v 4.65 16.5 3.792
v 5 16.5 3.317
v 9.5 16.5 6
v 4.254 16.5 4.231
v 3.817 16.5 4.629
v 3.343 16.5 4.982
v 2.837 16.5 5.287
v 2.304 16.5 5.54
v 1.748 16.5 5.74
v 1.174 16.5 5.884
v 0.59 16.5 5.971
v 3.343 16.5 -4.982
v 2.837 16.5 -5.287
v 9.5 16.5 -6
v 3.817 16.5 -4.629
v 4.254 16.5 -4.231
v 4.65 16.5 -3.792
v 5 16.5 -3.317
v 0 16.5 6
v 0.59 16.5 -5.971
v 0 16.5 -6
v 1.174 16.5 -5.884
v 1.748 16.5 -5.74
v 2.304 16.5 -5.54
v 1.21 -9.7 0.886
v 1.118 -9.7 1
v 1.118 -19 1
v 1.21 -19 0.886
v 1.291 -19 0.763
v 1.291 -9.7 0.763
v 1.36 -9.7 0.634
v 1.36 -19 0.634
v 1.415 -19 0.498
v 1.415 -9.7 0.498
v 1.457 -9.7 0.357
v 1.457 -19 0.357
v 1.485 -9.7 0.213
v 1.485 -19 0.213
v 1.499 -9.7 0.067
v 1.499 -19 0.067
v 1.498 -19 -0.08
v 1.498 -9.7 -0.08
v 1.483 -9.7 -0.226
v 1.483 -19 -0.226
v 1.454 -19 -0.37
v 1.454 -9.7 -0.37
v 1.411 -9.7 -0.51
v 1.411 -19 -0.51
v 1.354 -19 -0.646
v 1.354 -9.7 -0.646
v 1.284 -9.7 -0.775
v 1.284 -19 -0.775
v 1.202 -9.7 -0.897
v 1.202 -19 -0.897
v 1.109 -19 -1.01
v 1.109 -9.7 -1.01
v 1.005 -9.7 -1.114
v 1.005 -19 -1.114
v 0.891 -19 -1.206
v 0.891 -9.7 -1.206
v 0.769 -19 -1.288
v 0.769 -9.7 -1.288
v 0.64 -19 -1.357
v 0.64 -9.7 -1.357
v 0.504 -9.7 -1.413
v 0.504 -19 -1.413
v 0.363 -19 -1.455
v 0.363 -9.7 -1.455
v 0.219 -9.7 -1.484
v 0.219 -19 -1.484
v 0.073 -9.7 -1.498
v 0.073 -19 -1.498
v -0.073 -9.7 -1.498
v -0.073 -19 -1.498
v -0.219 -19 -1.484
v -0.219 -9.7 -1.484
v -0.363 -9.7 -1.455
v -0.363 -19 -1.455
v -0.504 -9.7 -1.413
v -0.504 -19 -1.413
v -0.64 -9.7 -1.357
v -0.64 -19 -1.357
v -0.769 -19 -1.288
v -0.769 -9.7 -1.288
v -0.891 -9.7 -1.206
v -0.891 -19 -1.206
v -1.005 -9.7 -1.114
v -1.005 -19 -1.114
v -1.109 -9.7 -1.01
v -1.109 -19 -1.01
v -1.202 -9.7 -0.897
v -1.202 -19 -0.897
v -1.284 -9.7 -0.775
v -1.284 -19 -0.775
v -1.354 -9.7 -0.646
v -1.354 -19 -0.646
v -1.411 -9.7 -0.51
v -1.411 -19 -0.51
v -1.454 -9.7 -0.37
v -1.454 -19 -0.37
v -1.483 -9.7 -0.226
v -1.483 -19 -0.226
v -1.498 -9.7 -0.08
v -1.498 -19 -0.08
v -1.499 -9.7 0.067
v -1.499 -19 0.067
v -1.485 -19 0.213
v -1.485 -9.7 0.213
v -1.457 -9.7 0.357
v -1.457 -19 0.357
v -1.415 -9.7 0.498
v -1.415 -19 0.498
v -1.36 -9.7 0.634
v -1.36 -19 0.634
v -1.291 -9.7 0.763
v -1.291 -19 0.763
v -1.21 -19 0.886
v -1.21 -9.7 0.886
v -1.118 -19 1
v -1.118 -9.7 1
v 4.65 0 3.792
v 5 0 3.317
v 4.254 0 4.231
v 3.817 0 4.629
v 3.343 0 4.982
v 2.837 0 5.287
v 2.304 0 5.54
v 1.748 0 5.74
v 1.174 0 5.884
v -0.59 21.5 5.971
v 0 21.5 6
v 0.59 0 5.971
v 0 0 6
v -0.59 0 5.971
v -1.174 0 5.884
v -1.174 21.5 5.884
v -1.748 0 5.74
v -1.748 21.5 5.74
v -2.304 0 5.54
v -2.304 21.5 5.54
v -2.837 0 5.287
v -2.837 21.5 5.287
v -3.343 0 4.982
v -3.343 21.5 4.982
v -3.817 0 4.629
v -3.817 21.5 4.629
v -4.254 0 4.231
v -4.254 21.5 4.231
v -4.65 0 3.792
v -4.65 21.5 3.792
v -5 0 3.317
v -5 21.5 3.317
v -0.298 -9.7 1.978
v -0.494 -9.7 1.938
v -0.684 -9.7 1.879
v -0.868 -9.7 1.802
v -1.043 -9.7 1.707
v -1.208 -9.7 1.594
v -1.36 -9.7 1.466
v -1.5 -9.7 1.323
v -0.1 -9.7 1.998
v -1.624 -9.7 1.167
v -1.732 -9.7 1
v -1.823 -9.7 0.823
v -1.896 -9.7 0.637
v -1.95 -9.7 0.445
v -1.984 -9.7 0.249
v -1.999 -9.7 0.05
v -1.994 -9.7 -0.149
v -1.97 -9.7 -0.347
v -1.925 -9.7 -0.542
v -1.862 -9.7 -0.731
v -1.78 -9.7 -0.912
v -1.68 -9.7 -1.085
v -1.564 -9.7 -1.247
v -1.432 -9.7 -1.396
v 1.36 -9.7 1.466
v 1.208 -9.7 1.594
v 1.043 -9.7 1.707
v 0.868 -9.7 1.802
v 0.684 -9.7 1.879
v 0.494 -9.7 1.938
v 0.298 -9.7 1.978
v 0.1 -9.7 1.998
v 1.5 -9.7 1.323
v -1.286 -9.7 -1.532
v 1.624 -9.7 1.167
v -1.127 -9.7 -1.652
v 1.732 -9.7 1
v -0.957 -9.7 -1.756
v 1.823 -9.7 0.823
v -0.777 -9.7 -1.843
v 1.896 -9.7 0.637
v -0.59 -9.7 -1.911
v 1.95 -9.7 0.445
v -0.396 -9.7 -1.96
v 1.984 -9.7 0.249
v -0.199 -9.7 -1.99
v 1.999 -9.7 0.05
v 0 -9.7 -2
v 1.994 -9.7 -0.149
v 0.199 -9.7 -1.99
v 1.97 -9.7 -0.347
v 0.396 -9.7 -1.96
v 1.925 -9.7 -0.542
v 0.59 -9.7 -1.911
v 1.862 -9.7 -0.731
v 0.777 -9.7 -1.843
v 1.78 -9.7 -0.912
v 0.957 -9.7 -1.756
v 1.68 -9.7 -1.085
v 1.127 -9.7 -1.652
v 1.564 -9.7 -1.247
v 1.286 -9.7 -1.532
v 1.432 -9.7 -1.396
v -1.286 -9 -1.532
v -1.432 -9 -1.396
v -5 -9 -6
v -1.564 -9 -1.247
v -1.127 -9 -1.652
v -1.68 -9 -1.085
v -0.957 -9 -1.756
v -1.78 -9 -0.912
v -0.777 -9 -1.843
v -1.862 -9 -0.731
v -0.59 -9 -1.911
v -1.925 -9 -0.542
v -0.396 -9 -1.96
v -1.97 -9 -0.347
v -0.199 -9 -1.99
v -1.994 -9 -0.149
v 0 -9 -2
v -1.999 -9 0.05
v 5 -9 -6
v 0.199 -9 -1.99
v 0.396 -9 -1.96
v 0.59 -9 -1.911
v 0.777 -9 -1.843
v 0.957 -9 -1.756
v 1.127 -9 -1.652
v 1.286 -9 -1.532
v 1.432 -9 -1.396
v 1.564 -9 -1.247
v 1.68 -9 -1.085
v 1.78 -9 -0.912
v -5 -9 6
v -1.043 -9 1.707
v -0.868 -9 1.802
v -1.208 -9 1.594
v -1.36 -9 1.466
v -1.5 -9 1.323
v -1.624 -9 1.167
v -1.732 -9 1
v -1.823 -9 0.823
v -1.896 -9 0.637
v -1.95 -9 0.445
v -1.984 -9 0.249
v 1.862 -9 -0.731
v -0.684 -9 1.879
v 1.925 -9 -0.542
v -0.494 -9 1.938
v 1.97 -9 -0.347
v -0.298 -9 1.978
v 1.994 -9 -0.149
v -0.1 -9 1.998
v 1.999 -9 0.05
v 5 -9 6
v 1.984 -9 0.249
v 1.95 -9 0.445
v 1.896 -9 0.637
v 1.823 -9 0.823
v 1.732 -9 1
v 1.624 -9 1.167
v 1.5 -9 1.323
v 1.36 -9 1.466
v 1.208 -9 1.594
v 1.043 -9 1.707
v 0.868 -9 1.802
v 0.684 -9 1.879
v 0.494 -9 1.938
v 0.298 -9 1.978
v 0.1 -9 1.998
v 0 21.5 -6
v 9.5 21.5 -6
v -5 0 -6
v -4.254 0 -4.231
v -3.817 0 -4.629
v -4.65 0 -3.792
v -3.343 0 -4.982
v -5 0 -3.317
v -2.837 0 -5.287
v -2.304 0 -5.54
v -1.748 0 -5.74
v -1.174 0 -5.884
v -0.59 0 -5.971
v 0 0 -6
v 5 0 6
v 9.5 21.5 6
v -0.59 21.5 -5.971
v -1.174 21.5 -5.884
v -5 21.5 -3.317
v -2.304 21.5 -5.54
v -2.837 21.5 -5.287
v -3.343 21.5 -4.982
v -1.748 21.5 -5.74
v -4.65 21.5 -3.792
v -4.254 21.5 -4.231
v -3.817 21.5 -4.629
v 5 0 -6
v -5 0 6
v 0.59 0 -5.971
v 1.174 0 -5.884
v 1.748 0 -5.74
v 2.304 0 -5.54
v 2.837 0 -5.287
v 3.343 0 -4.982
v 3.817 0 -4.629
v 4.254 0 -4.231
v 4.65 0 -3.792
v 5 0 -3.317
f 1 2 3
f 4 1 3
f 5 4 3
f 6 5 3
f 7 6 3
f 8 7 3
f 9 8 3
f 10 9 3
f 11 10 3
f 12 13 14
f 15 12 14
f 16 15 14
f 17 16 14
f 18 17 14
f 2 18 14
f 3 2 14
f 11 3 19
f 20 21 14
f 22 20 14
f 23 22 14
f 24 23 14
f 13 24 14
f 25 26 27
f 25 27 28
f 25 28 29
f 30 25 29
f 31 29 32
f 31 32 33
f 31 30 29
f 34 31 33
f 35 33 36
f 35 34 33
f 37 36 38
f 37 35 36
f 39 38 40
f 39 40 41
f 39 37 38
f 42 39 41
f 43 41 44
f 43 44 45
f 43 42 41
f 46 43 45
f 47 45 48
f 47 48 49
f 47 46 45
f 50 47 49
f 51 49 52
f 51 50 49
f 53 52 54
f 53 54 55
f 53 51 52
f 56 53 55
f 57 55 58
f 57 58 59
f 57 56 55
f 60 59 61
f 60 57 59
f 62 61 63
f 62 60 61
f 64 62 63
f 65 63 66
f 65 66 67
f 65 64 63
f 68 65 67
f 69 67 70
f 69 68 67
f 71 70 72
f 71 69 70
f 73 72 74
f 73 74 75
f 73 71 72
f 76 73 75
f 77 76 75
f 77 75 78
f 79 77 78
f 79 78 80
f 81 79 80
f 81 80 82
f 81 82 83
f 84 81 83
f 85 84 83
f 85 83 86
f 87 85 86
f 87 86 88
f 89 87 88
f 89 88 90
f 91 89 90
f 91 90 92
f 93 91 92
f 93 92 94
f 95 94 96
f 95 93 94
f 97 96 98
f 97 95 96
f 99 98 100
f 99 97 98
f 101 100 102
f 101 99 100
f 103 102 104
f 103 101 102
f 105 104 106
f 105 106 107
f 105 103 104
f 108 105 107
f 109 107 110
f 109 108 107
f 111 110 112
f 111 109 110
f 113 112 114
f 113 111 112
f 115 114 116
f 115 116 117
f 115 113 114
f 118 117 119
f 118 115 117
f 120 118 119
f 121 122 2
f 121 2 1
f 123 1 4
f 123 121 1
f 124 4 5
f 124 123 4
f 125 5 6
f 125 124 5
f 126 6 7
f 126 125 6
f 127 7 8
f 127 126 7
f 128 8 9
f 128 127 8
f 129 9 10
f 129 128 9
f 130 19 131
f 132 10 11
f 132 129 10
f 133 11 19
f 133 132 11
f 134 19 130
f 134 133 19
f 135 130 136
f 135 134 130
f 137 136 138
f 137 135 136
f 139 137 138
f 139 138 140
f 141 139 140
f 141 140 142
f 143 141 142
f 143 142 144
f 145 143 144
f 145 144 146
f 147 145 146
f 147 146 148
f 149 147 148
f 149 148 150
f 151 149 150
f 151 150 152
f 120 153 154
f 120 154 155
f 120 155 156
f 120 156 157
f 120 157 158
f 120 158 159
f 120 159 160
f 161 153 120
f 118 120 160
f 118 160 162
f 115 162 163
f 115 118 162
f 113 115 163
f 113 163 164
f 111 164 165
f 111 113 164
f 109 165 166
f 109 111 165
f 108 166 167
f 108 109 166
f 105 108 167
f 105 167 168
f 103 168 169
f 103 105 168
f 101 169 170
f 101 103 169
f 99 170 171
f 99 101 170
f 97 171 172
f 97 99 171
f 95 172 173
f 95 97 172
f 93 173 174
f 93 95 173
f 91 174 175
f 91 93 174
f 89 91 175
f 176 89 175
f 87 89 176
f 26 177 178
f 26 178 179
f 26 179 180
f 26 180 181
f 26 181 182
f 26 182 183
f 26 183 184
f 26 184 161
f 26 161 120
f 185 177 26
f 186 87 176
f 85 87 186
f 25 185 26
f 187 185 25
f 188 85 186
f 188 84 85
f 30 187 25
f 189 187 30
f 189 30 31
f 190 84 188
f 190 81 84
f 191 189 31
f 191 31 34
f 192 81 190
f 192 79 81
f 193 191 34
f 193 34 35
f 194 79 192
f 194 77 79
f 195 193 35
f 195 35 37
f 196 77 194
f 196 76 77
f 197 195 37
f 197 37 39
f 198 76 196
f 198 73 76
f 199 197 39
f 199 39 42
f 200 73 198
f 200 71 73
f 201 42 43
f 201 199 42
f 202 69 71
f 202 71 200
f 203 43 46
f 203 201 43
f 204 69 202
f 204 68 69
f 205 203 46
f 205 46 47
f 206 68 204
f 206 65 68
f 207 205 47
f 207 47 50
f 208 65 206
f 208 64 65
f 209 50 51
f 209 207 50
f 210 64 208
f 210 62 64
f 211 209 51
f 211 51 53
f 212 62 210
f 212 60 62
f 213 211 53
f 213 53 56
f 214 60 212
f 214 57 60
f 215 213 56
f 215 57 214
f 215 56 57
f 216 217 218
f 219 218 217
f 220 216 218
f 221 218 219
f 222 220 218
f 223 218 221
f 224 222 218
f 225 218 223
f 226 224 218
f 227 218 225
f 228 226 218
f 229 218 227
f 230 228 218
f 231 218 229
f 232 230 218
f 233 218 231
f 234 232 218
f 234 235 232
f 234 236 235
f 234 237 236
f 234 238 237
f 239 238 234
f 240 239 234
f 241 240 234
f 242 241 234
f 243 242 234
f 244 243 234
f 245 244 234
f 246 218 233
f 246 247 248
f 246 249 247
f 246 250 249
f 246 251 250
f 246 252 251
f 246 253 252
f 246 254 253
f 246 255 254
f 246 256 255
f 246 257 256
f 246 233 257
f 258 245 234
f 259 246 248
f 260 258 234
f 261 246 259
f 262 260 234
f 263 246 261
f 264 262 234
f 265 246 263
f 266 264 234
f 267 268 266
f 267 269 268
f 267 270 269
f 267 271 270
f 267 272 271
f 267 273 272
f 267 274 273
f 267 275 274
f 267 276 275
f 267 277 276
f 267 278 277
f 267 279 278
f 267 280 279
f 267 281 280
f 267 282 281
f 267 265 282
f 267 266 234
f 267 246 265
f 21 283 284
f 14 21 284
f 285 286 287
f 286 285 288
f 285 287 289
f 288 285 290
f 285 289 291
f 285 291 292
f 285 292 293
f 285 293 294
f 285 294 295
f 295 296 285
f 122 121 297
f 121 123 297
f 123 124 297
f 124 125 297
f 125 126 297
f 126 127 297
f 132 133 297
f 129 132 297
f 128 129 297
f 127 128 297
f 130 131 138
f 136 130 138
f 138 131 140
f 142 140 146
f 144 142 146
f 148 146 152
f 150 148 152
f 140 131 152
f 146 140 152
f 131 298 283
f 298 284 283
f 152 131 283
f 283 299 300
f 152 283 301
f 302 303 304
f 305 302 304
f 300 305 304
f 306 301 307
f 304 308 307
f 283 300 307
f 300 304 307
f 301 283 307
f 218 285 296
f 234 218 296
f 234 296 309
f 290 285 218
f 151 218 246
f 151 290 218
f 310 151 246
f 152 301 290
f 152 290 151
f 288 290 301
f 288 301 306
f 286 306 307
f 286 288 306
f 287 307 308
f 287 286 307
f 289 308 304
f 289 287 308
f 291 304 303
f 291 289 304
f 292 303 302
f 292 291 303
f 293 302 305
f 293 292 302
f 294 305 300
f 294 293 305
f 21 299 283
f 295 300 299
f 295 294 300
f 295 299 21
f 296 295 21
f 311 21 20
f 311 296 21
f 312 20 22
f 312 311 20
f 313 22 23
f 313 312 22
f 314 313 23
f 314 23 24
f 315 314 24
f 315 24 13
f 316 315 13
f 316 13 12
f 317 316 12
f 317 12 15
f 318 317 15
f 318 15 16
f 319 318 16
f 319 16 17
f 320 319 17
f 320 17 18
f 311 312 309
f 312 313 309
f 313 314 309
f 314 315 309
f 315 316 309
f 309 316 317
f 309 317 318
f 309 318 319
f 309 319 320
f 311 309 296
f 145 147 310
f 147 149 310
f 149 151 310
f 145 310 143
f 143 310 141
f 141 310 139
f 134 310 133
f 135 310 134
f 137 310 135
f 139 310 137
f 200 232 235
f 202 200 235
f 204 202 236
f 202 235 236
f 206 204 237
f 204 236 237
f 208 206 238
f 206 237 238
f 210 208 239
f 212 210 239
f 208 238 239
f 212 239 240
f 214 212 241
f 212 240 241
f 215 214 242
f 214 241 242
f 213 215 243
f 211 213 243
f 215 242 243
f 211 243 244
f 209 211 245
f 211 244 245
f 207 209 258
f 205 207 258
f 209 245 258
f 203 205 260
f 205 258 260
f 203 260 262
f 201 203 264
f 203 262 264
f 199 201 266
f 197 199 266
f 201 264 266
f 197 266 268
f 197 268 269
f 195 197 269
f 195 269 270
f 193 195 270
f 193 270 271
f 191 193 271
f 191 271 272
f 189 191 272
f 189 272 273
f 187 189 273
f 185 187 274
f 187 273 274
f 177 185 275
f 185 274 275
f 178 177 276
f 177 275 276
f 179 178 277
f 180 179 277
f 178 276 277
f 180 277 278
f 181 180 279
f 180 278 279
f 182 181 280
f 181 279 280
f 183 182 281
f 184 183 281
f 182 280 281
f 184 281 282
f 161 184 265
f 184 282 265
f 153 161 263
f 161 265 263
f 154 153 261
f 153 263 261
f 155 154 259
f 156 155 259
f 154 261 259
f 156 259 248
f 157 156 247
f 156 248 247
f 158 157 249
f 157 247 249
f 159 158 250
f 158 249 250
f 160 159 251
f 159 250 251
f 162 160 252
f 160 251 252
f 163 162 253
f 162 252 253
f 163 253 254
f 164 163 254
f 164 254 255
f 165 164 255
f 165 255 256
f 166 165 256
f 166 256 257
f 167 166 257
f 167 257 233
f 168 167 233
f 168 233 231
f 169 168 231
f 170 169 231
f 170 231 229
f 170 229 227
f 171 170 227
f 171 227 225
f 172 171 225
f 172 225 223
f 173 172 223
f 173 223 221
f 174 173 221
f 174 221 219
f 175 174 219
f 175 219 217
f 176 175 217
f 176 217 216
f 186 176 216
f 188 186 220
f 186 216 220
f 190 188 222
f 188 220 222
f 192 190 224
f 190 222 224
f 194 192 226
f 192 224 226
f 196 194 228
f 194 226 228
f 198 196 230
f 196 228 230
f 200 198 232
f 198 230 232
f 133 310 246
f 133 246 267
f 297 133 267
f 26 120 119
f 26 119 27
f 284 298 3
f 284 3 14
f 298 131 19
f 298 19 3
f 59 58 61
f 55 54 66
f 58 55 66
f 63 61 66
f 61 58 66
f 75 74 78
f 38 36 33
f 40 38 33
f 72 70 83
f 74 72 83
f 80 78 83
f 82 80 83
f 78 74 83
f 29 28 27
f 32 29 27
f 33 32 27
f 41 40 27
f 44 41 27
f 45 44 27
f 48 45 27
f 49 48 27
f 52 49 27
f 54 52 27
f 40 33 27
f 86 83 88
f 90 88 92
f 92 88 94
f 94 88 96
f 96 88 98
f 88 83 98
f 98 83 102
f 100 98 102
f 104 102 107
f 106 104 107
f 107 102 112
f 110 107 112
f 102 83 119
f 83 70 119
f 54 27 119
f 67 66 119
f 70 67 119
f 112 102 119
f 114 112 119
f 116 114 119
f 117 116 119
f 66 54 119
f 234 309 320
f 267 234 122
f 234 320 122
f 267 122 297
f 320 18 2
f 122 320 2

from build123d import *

# Parameters (mm, degrees)
EXTRUDE_1_DEPTH = 21.5
SKETCH_2_W      = 9.5
SKETCH_2_H      = 12
EXTRUDE_2_DEPTH = 5
SKETCH_3_W      = 10
SKETCH_3_H      = 12
EXTRUDE_3_DEPTH = 9
SKETCH_4_R      = 2
EXTRUDE_4_DEPTH = 0.7
EXTRUDE_6_DEPTH = 9.3


with BuildPart() as part:
    # 草图1 → 凸台-拉伸1 (new body)
    with BuildSketch(Plane(origin=(0, 0, 0), x_dir=(1, 0, 0), z_dir=(0, 1, 0))):
        with BuildLine():
            Line((-5, -3.31662479), (-5, 3.31662479))
            ThreePointArc((-5, 3.31662479), (0, 6), (5, 3.31662479))
            Line((5, 3.31662479), (5, -3.31662479))
            ThreePointArc((5, -3.31662479), (0, -6), (-5, -3.31662479))
        make_face()
    extrude(amount=EXTRUDE_1_DEPTH)

    # 草图2 → 凸台-拉伸2 (add)
    with BuildSketch(Plane(origin=(0, 21.5, 0), x_dir=(1, 0, 0), z_dir=(0, 1, 0))):
        with Locations((4.75, 0)):
            Rectangle(SKETCH_2_W, SKETCH_2_H)
    extrude(amount=-EXTRUDE_2_DEPTH)

    # 草图3 → 凸台-拉伸3 (add)
    with BuildSketch(Plane.XZ):
        Rectangle(SKETCH_3_W, SKETCH_3_H)
    extrude(amount=EXTRUDE_3_DEPTH)

    # 草图4 → 凸台-拉伸4 (add)
    with BuildSketch(Plane.XZ.offset(9)):
        with Locations(Location((0, 0, 0), (0, 0, 270))):
            Circle(SKETCH_4_R)
    extrude(amount=EXTRUDE_4_DEPTH)

    # 草图5 → 凸台-拉伸6 (add)
    with BuildSketch(Plane.XZ.offset(9.7)):
        with BuildLine():
            Line((-1.118033989, 1), (1.118033989, 1))
            ThreePointArc((1.118033989, 1), (0, -1.5), (-1.118033989, 1))
        make_face()
    extrude(amount=EXTRUDE_6_DEPTH)


solid = part.part
